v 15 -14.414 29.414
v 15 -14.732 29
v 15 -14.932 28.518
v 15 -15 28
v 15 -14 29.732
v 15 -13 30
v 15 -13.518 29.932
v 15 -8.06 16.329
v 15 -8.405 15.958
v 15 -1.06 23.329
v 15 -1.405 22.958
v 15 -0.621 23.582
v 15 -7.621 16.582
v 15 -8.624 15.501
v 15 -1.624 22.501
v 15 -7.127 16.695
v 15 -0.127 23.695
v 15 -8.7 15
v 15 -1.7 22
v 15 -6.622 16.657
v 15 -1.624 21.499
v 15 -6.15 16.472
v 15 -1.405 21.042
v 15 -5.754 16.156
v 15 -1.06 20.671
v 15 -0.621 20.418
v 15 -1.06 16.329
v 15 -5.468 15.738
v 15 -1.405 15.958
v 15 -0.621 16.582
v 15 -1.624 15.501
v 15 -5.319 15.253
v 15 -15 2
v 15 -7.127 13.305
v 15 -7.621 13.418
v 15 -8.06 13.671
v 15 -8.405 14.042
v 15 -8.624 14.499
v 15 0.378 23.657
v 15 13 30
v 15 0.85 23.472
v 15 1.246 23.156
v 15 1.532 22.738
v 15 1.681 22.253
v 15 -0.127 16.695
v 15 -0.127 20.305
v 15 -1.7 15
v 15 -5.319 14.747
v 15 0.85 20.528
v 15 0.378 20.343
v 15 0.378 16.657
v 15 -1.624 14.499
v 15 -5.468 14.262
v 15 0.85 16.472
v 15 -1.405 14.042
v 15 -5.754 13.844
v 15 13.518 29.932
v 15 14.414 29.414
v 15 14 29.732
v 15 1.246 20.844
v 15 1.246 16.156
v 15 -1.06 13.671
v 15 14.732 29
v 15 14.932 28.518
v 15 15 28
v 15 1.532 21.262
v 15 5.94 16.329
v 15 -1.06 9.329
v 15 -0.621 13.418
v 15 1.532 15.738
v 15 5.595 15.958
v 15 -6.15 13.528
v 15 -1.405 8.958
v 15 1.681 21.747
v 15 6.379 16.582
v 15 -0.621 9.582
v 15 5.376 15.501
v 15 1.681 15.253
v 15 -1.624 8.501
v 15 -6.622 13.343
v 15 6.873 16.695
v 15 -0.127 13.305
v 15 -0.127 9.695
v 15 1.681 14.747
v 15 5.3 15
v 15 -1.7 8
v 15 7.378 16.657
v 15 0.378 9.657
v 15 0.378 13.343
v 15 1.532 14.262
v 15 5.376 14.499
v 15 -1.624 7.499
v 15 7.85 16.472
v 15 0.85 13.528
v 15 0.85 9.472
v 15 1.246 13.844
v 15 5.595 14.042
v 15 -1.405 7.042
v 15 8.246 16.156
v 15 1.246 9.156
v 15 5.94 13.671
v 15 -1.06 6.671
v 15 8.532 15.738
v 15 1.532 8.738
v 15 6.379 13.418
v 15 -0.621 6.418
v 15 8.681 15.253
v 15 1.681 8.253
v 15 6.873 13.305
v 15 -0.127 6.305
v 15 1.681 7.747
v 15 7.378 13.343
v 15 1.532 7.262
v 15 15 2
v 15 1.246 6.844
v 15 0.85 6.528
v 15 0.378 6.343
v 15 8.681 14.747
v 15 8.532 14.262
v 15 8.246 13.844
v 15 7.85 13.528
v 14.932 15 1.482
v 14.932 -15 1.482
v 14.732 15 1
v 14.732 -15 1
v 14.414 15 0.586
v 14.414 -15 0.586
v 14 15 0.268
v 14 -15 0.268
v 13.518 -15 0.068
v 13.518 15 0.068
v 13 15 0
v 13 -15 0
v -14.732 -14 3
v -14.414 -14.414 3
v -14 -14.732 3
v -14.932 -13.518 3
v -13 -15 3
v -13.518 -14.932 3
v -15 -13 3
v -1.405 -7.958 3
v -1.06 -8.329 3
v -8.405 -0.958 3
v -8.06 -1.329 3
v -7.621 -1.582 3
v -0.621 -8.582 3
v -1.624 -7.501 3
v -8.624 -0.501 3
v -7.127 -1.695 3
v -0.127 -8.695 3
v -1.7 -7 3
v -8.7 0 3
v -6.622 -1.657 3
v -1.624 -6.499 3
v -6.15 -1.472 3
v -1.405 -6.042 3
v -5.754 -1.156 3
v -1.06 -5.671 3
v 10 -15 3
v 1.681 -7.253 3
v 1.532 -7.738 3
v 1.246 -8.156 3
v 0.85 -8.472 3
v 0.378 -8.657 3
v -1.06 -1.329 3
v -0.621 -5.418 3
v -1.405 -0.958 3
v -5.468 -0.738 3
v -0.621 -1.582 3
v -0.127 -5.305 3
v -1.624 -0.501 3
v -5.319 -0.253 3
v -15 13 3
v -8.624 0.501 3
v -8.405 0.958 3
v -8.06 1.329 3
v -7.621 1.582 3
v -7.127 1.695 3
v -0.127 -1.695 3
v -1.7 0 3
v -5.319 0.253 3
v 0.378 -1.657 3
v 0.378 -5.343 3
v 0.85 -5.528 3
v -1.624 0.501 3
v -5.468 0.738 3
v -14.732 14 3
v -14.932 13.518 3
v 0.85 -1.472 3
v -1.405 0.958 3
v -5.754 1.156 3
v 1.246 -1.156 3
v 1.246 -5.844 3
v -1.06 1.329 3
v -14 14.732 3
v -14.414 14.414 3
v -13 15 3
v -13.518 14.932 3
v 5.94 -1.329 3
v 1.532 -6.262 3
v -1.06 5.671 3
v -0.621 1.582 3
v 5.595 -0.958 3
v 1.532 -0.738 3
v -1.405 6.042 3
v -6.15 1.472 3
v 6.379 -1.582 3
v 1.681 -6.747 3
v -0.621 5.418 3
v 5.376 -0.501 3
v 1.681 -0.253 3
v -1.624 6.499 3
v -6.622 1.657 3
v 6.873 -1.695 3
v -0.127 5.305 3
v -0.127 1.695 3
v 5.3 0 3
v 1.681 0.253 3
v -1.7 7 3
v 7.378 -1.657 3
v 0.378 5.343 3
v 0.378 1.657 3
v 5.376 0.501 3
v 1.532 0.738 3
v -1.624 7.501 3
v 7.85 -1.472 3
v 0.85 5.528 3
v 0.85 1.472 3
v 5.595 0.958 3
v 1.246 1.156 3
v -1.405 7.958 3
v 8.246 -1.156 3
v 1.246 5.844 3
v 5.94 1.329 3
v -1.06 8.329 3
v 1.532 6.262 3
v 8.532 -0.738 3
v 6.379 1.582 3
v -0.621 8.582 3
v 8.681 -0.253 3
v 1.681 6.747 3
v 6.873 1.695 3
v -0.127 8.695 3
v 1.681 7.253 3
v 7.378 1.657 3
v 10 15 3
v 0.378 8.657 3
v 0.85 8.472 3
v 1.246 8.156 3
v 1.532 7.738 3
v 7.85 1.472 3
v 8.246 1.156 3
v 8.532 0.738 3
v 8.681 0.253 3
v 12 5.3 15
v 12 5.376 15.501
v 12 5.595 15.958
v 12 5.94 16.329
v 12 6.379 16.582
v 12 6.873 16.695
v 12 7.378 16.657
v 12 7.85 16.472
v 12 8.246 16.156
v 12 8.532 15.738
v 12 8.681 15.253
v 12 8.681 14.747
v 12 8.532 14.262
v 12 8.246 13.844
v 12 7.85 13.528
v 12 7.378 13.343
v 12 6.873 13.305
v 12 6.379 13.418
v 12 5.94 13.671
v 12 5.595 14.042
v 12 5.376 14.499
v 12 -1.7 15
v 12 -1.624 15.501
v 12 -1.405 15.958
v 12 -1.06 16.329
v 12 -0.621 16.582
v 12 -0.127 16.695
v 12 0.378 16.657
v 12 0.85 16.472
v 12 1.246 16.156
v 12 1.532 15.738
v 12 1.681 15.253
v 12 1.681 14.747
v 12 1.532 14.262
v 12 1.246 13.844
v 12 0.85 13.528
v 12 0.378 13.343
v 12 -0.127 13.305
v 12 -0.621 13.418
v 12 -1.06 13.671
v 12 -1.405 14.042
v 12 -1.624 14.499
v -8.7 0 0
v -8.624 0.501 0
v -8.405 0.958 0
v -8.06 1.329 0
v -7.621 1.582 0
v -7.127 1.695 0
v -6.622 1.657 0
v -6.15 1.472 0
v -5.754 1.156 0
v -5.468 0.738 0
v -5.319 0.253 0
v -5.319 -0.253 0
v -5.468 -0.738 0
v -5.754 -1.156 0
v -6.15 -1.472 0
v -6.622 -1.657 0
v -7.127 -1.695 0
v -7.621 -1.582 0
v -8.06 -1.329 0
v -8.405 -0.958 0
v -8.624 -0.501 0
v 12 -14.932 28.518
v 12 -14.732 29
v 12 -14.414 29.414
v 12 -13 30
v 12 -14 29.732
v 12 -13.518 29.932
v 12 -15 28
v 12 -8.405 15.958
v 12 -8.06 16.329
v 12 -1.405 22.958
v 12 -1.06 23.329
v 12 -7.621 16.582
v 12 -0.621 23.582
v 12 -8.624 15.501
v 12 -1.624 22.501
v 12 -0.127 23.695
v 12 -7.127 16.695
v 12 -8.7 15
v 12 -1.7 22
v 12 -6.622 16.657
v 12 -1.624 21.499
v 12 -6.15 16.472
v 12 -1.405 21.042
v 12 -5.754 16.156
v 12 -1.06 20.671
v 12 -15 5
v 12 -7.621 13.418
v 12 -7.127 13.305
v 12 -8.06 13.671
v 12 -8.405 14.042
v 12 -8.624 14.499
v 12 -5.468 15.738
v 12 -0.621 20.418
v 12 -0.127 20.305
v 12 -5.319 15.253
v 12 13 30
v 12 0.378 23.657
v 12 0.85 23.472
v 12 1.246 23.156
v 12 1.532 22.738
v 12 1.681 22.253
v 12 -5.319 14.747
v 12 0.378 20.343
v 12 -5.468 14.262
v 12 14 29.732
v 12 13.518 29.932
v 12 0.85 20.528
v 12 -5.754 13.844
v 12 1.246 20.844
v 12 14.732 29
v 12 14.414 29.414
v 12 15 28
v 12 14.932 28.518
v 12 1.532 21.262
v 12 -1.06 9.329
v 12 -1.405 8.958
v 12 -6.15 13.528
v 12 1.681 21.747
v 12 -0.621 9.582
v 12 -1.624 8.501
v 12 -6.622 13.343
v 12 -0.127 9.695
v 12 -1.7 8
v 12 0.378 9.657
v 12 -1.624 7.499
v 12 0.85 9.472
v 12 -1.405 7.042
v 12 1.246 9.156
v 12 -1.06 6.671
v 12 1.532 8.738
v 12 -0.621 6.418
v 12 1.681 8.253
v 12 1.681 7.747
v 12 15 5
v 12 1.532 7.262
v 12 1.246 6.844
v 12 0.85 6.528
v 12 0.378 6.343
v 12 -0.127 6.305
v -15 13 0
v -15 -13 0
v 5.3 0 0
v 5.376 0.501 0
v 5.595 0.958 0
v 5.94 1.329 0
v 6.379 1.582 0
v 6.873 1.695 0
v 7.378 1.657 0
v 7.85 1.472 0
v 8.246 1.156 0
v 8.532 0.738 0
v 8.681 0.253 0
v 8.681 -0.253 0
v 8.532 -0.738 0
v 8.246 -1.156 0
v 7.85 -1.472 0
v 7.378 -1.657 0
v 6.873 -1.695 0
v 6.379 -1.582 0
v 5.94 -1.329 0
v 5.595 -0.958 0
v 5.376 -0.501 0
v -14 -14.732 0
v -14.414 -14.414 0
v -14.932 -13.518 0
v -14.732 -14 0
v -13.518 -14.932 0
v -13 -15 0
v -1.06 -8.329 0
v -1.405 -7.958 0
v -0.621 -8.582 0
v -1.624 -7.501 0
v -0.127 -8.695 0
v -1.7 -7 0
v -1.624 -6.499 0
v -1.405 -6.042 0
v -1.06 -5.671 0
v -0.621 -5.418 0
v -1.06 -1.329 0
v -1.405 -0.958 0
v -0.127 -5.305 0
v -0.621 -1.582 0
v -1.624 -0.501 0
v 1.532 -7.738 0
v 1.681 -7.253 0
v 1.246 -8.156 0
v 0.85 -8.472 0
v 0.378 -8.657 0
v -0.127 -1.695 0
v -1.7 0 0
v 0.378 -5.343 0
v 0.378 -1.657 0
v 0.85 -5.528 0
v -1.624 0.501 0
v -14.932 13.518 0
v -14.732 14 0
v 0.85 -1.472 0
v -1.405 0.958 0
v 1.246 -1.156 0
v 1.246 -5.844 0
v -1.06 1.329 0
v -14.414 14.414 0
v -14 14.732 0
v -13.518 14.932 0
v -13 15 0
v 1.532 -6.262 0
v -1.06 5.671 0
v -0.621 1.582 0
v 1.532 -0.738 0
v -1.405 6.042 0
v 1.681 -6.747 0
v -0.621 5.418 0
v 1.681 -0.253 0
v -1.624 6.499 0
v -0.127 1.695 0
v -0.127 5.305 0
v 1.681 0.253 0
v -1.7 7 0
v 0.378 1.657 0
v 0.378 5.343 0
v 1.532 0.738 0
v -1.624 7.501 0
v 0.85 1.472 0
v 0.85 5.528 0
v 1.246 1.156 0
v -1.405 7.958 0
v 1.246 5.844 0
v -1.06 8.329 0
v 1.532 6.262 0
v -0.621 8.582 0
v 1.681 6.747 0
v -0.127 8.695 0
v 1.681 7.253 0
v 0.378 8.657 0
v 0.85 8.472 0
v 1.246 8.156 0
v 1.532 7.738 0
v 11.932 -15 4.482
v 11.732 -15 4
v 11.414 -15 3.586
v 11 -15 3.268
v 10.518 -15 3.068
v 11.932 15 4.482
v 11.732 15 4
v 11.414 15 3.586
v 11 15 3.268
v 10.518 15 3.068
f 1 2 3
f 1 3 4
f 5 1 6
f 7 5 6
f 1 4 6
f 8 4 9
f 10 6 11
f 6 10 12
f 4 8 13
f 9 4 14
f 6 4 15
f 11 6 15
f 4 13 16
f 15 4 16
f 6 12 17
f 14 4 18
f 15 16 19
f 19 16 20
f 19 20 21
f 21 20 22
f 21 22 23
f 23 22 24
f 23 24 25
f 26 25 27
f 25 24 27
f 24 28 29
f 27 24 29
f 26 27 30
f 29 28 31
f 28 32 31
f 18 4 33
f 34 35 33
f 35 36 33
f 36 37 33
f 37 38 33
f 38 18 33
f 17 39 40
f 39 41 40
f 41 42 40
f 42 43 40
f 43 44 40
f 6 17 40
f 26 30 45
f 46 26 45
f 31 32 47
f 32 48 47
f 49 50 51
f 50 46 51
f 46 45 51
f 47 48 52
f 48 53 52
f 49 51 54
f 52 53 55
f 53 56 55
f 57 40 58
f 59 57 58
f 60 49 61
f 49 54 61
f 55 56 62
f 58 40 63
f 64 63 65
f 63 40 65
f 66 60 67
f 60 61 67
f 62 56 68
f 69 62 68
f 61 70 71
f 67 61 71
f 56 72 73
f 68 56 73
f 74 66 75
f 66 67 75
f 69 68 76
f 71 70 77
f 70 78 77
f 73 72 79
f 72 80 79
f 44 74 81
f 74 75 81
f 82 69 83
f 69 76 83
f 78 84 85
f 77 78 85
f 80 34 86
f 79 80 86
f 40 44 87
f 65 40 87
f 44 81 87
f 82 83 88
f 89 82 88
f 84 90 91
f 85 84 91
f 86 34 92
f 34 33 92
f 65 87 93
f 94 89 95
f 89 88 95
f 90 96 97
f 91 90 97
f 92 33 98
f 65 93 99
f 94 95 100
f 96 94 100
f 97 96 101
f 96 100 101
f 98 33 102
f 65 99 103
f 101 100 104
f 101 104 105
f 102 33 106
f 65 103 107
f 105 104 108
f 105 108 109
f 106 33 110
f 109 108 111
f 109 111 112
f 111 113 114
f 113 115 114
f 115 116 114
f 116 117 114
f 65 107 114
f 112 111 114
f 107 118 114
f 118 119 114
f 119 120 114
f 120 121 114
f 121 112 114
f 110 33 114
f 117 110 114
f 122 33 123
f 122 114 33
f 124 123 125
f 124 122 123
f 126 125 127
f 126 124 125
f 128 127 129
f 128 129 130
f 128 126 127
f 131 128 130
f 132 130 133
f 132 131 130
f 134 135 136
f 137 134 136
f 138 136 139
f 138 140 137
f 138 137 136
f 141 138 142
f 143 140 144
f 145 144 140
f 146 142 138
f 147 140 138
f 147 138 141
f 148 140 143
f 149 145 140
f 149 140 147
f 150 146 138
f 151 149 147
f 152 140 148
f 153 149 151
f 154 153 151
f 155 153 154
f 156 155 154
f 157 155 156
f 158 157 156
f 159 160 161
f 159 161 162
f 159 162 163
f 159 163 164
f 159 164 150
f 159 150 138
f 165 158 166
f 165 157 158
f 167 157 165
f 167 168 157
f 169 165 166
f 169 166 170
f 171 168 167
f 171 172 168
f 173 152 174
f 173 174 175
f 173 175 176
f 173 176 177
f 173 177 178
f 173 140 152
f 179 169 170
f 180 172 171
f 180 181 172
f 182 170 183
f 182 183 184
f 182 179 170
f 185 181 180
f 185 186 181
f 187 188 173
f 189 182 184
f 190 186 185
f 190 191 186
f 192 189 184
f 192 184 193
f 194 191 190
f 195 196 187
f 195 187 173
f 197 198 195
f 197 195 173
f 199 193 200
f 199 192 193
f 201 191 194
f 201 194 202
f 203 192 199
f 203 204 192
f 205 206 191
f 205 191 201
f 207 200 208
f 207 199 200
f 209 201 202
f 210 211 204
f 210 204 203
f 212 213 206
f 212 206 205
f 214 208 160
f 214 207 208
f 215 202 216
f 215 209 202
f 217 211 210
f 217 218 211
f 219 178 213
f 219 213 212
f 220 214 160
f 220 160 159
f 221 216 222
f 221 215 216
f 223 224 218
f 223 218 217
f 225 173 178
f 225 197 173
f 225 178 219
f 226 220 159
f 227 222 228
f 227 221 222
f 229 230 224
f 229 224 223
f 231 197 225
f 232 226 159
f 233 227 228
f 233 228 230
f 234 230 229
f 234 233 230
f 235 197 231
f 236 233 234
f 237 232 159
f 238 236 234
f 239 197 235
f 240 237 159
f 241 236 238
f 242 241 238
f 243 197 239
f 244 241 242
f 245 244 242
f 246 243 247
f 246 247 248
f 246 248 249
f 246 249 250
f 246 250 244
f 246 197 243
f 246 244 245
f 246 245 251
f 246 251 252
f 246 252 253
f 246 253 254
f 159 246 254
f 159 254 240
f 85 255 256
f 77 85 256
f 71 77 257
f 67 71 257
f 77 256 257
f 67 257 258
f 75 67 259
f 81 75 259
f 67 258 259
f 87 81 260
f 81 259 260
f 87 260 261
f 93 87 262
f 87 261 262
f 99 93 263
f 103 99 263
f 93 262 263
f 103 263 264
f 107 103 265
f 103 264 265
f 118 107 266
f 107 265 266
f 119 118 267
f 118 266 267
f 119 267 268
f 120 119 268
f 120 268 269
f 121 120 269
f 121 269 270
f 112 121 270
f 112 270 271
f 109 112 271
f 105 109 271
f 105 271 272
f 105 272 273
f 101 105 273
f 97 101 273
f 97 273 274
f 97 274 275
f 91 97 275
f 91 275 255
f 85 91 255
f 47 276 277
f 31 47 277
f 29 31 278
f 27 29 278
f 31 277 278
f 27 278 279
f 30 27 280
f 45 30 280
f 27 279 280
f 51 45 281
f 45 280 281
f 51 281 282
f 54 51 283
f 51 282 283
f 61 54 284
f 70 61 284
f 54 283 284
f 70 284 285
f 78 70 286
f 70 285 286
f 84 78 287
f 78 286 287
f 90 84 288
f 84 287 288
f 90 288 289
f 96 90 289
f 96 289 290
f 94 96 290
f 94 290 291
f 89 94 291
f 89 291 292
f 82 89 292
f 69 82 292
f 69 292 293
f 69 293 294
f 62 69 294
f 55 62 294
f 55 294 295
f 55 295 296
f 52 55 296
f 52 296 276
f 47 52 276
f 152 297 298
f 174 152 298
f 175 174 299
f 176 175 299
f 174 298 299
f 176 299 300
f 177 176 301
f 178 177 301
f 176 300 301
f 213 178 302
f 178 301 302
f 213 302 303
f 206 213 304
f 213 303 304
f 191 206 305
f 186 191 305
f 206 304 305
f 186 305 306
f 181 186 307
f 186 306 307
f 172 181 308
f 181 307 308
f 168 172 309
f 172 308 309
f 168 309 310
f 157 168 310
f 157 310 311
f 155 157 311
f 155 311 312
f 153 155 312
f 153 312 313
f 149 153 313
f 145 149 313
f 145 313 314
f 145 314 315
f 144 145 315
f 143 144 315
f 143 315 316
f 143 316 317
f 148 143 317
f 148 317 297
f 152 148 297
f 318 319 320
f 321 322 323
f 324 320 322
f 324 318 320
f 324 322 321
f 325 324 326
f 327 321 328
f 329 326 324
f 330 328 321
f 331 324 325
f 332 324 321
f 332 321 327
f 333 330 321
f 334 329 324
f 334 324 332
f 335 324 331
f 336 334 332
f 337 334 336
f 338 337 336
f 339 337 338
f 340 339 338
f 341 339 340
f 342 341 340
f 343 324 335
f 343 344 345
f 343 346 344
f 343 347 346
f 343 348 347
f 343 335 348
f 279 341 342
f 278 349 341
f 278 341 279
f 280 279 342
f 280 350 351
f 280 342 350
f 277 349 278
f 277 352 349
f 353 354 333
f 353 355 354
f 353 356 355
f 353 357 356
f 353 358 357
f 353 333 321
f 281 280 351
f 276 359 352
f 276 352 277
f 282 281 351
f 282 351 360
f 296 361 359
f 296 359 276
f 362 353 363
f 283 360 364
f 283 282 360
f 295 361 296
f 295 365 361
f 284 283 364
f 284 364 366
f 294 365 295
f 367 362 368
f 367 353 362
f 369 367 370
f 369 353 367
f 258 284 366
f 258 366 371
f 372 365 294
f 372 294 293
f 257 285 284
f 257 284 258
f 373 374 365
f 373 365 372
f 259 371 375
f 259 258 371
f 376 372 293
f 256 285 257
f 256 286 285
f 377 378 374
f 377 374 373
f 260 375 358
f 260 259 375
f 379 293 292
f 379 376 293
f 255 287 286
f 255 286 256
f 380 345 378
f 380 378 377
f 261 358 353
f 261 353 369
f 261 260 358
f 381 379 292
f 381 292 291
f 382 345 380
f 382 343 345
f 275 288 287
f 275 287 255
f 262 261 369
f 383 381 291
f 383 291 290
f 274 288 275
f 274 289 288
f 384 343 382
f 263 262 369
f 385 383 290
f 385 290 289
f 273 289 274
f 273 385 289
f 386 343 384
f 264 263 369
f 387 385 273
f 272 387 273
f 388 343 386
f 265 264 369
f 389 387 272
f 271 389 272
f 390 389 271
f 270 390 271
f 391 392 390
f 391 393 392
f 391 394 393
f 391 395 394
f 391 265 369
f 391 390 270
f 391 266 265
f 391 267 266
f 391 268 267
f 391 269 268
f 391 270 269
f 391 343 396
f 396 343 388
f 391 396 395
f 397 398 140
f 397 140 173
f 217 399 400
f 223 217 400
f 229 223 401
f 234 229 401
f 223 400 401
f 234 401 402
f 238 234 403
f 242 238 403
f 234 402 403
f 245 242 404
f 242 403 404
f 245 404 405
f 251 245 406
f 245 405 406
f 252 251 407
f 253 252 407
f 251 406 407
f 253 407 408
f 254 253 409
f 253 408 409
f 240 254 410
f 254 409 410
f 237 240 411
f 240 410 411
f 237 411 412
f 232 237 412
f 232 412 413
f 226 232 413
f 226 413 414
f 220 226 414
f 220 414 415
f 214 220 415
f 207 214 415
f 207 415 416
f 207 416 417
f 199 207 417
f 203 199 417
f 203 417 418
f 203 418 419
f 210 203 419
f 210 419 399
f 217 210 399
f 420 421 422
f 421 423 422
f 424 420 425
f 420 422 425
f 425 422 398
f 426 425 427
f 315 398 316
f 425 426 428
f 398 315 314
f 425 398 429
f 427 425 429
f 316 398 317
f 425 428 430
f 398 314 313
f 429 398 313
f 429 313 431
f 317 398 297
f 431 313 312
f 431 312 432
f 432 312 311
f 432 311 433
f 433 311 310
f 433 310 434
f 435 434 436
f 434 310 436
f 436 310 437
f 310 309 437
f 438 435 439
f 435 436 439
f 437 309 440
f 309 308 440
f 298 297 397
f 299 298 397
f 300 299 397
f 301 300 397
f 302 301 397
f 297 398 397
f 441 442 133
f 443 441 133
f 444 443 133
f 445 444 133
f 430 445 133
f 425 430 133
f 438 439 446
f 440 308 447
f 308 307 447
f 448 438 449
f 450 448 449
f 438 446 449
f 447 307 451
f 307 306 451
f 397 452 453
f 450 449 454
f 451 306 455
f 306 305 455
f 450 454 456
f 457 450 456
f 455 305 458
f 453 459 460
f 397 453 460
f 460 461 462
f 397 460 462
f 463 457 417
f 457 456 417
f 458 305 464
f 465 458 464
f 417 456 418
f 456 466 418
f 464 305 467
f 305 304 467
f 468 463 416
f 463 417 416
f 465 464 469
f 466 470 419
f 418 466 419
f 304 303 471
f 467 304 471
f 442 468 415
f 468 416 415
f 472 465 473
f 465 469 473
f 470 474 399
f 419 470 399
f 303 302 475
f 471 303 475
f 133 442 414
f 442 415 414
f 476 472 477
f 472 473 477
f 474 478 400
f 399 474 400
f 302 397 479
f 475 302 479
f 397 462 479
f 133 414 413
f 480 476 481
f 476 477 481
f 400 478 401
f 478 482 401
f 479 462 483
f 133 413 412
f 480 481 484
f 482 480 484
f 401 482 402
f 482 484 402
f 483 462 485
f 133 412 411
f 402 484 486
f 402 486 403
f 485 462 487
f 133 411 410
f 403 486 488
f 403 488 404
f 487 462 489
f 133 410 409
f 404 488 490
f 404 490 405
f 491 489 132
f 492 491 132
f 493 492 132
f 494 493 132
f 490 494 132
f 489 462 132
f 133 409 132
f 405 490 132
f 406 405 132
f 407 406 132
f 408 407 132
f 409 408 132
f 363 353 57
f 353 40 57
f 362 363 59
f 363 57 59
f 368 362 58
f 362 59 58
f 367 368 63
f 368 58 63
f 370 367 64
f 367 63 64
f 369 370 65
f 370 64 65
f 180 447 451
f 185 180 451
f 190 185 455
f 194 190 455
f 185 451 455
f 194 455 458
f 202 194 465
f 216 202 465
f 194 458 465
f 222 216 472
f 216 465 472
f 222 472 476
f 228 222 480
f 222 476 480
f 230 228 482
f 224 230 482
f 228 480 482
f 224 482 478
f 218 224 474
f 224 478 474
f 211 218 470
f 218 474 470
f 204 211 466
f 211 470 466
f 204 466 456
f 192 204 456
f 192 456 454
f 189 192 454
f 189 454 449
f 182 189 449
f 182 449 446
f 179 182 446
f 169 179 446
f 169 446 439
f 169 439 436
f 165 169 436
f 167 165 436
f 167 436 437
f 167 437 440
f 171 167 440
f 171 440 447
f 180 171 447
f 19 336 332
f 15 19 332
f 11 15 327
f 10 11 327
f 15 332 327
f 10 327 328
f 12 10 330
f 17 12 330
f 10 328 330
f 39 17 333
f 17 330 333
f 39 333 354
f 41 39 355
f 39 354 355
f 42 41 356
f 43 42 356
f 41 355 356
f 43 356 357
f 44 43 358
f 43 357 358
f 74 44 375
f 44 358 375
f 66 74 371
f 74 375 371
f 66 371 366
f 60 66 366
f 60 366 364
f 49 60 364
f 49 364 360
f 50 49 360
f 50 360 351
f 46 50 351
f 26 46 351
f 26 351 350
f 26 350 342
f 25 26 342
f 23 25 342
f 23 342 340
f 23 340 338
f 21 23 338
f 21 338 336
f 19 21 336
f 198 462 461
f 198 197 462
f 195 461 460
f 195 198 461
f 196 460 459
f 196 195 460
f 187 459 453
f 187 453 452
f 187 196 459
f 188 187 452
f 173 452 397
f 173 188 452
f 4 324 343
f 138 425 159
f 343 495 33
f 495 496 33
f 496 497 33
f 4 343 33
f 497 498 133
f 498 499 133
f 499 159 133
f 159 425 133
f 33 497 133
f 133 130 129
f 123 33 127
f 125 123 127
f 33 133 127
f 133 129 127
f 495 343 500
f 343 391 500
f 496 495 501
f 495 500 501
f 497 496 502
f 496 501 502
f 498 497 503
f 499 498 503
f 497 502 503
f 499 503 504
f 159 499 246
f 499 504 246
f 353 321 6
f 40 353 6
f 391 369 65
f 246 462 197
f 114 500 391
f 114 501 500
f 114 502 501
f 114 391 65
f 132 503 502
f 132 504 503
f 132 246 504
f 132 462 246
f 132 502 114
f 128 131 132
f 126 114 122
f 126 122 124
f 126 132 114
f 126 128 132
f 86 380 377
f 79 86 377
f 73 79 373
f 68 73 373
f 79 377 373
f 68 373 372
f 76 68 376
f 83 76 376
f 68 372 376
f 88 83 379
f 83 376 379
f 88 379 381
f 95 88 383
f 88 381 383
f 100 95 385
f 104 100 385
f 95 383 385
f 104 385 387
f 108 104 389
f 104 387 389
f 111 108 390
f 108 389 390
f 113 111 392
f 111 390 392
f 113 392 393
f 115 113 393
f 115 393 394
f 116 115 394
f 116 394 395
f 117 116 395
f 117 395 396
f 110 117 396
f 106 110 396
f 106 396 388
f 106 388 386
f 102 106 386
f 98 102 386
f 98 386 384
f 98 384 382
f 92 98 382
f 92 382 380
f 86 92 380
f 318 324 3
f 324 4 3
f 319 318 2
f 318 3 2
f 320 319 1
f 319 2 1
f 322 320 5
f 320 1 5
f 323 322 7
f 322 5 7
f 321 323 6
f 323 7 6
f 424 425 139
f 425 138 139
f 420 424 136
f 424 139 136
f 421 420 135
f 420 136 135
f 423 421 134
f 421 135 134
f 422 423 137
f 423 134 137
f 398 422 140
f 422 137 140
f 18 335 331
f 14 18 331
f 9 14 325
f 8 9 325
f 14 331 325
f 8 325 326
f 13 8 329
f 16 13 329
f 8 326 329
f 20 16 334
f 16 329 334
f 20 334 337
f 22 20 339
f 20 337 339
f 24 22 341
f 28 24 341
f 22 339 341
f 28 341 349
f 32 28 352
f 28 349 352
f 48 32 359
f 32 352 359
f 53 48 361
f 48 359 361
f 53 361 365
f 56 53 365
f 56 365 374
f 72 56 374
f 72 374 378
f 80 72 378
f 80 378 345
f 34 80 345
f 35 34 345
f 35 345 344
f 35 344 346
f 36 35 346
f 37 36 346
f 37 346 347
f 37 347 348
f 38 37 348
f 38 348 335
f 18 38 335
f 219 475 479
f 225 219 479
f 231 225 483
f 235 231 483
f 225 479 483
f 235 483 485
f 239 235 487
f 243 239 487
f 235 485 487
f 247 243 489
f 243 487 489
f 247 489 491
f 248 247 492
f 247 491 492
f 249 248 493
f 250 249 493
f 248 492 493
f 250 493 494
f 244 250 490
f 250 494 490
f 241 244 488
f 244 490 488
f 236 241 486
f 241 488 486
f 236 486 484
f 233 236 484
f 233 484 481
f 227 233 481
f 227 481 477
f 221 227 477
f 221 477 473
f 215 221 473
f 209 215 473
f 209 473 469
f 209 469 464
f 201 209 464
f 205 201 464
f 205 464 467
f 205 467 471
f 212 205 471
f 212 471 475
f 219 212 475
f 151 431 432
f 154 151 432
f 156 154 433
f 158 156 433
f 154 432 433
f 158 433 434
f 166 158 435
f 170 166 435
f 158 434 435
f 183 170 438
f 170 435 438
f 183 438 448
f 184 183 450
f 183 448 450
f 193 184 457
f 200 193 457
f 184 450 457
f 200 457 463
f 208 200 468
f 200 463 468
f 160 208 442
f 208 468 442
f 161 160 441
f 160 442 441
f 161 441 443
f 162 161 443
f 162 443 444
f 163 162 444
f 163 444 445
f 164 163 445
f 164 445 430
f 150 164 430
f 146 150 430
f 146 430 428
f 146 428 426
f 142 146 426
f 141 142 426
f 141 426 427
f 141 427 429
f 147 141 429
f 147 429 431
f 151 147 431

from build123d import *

# Parameters (mm, degrees)
SKETCH1_W                      = 27
SKETCH1_H                      = 30
BOSS_EXTRUDE1_DEPTH            = 3
SKETCH1_3_W                    = 3
SKETCH1_3_H                    = 30
BOSS_EXTRUDE2_DEPTH            = 30
M3_CLEARANCE_HOLE1_D           = 3.4
M3_CLEARANCE_HOLE1_ON_FACE_2_D = 3.4
M3_CLEARANCE_HOLE2_D           = 3.4
FILLET1_R                      = 2
FILLET2_R                      = 2


with BuildPart() as part:
    # Sketch1 → Boss-Extrude1 (new body)
    with BuildSketch(Plane.XY):
        with Locations((-1.5, 0)):
            Rectangle(SKETCH1_W, SKETCH1_H)
    extrude(amount=BOSS_EXTRUDE1_DEPTH)

    # Sketch1<3> → Boss-Extrude2 (add)
    with BuildSketch(Plane.XY):
        with Locations((13.5, 0)):
            Rectangle(SKETCH1_3_W, SKETCH1_3_H)
    extrude(amount=BOSS_EXTRUDE2_DEPTH)

    # M3 Clearance Hole1 (through all)
    with Locations(Plane(origin=(0, 7, 3), x_dir=(1, 0, 0), z_dir=(0, 0, 1))):
        with Locations((0, 0), (-7, -7), (7, -7), (0, -14), (0, -7)):
            Hole(M3_CLEARANCE_HOLE1_D / 2)

    # M3 Clearance Hole1 on face 2 (through all)
    with Locations(Plane(origin=(0, 0, 0), x_dir=(-1, 0, 0), z_dir=(0, 0, -1))):
        with Locations((0, 0)):
            Hole(M3_CLEARANCE_HOLE1_ON_FACE_2_D / 2)

    # M3 Clearance Hole2 (through all)
    with Locations(Plane(origin=(15, 7, 15), x_dir=(0, 1, 0), z_dir=(1, 0, 0))):
        with Locations((0, 0), (-7, 7), (-7, 0), (-7, -7), (-14, 0)):
            Hole(M3_CLEARANCE_HOLE2_D / 2)

    # Fillet1
    fillet1_edges = [part.edges().sort_by_distance(p)[0] for p in [
        (15, 0, 0),
        (12, 0, 3),
    ]]
    fillet(fillet1_edges, radius=FILLET1_R)

    # Fillet2
    fillet2_edges = [part.edges().sort_by_distance(p)[0] for p in [
        (13.5, 15, 30),
        (13.5, -15, 30),
        (-15, -15, 1.5),
        (-15, 15, 1.5),
    ]]
    fillet(fillet2_edges, radius=FILLET2_R)


solid = part.part
